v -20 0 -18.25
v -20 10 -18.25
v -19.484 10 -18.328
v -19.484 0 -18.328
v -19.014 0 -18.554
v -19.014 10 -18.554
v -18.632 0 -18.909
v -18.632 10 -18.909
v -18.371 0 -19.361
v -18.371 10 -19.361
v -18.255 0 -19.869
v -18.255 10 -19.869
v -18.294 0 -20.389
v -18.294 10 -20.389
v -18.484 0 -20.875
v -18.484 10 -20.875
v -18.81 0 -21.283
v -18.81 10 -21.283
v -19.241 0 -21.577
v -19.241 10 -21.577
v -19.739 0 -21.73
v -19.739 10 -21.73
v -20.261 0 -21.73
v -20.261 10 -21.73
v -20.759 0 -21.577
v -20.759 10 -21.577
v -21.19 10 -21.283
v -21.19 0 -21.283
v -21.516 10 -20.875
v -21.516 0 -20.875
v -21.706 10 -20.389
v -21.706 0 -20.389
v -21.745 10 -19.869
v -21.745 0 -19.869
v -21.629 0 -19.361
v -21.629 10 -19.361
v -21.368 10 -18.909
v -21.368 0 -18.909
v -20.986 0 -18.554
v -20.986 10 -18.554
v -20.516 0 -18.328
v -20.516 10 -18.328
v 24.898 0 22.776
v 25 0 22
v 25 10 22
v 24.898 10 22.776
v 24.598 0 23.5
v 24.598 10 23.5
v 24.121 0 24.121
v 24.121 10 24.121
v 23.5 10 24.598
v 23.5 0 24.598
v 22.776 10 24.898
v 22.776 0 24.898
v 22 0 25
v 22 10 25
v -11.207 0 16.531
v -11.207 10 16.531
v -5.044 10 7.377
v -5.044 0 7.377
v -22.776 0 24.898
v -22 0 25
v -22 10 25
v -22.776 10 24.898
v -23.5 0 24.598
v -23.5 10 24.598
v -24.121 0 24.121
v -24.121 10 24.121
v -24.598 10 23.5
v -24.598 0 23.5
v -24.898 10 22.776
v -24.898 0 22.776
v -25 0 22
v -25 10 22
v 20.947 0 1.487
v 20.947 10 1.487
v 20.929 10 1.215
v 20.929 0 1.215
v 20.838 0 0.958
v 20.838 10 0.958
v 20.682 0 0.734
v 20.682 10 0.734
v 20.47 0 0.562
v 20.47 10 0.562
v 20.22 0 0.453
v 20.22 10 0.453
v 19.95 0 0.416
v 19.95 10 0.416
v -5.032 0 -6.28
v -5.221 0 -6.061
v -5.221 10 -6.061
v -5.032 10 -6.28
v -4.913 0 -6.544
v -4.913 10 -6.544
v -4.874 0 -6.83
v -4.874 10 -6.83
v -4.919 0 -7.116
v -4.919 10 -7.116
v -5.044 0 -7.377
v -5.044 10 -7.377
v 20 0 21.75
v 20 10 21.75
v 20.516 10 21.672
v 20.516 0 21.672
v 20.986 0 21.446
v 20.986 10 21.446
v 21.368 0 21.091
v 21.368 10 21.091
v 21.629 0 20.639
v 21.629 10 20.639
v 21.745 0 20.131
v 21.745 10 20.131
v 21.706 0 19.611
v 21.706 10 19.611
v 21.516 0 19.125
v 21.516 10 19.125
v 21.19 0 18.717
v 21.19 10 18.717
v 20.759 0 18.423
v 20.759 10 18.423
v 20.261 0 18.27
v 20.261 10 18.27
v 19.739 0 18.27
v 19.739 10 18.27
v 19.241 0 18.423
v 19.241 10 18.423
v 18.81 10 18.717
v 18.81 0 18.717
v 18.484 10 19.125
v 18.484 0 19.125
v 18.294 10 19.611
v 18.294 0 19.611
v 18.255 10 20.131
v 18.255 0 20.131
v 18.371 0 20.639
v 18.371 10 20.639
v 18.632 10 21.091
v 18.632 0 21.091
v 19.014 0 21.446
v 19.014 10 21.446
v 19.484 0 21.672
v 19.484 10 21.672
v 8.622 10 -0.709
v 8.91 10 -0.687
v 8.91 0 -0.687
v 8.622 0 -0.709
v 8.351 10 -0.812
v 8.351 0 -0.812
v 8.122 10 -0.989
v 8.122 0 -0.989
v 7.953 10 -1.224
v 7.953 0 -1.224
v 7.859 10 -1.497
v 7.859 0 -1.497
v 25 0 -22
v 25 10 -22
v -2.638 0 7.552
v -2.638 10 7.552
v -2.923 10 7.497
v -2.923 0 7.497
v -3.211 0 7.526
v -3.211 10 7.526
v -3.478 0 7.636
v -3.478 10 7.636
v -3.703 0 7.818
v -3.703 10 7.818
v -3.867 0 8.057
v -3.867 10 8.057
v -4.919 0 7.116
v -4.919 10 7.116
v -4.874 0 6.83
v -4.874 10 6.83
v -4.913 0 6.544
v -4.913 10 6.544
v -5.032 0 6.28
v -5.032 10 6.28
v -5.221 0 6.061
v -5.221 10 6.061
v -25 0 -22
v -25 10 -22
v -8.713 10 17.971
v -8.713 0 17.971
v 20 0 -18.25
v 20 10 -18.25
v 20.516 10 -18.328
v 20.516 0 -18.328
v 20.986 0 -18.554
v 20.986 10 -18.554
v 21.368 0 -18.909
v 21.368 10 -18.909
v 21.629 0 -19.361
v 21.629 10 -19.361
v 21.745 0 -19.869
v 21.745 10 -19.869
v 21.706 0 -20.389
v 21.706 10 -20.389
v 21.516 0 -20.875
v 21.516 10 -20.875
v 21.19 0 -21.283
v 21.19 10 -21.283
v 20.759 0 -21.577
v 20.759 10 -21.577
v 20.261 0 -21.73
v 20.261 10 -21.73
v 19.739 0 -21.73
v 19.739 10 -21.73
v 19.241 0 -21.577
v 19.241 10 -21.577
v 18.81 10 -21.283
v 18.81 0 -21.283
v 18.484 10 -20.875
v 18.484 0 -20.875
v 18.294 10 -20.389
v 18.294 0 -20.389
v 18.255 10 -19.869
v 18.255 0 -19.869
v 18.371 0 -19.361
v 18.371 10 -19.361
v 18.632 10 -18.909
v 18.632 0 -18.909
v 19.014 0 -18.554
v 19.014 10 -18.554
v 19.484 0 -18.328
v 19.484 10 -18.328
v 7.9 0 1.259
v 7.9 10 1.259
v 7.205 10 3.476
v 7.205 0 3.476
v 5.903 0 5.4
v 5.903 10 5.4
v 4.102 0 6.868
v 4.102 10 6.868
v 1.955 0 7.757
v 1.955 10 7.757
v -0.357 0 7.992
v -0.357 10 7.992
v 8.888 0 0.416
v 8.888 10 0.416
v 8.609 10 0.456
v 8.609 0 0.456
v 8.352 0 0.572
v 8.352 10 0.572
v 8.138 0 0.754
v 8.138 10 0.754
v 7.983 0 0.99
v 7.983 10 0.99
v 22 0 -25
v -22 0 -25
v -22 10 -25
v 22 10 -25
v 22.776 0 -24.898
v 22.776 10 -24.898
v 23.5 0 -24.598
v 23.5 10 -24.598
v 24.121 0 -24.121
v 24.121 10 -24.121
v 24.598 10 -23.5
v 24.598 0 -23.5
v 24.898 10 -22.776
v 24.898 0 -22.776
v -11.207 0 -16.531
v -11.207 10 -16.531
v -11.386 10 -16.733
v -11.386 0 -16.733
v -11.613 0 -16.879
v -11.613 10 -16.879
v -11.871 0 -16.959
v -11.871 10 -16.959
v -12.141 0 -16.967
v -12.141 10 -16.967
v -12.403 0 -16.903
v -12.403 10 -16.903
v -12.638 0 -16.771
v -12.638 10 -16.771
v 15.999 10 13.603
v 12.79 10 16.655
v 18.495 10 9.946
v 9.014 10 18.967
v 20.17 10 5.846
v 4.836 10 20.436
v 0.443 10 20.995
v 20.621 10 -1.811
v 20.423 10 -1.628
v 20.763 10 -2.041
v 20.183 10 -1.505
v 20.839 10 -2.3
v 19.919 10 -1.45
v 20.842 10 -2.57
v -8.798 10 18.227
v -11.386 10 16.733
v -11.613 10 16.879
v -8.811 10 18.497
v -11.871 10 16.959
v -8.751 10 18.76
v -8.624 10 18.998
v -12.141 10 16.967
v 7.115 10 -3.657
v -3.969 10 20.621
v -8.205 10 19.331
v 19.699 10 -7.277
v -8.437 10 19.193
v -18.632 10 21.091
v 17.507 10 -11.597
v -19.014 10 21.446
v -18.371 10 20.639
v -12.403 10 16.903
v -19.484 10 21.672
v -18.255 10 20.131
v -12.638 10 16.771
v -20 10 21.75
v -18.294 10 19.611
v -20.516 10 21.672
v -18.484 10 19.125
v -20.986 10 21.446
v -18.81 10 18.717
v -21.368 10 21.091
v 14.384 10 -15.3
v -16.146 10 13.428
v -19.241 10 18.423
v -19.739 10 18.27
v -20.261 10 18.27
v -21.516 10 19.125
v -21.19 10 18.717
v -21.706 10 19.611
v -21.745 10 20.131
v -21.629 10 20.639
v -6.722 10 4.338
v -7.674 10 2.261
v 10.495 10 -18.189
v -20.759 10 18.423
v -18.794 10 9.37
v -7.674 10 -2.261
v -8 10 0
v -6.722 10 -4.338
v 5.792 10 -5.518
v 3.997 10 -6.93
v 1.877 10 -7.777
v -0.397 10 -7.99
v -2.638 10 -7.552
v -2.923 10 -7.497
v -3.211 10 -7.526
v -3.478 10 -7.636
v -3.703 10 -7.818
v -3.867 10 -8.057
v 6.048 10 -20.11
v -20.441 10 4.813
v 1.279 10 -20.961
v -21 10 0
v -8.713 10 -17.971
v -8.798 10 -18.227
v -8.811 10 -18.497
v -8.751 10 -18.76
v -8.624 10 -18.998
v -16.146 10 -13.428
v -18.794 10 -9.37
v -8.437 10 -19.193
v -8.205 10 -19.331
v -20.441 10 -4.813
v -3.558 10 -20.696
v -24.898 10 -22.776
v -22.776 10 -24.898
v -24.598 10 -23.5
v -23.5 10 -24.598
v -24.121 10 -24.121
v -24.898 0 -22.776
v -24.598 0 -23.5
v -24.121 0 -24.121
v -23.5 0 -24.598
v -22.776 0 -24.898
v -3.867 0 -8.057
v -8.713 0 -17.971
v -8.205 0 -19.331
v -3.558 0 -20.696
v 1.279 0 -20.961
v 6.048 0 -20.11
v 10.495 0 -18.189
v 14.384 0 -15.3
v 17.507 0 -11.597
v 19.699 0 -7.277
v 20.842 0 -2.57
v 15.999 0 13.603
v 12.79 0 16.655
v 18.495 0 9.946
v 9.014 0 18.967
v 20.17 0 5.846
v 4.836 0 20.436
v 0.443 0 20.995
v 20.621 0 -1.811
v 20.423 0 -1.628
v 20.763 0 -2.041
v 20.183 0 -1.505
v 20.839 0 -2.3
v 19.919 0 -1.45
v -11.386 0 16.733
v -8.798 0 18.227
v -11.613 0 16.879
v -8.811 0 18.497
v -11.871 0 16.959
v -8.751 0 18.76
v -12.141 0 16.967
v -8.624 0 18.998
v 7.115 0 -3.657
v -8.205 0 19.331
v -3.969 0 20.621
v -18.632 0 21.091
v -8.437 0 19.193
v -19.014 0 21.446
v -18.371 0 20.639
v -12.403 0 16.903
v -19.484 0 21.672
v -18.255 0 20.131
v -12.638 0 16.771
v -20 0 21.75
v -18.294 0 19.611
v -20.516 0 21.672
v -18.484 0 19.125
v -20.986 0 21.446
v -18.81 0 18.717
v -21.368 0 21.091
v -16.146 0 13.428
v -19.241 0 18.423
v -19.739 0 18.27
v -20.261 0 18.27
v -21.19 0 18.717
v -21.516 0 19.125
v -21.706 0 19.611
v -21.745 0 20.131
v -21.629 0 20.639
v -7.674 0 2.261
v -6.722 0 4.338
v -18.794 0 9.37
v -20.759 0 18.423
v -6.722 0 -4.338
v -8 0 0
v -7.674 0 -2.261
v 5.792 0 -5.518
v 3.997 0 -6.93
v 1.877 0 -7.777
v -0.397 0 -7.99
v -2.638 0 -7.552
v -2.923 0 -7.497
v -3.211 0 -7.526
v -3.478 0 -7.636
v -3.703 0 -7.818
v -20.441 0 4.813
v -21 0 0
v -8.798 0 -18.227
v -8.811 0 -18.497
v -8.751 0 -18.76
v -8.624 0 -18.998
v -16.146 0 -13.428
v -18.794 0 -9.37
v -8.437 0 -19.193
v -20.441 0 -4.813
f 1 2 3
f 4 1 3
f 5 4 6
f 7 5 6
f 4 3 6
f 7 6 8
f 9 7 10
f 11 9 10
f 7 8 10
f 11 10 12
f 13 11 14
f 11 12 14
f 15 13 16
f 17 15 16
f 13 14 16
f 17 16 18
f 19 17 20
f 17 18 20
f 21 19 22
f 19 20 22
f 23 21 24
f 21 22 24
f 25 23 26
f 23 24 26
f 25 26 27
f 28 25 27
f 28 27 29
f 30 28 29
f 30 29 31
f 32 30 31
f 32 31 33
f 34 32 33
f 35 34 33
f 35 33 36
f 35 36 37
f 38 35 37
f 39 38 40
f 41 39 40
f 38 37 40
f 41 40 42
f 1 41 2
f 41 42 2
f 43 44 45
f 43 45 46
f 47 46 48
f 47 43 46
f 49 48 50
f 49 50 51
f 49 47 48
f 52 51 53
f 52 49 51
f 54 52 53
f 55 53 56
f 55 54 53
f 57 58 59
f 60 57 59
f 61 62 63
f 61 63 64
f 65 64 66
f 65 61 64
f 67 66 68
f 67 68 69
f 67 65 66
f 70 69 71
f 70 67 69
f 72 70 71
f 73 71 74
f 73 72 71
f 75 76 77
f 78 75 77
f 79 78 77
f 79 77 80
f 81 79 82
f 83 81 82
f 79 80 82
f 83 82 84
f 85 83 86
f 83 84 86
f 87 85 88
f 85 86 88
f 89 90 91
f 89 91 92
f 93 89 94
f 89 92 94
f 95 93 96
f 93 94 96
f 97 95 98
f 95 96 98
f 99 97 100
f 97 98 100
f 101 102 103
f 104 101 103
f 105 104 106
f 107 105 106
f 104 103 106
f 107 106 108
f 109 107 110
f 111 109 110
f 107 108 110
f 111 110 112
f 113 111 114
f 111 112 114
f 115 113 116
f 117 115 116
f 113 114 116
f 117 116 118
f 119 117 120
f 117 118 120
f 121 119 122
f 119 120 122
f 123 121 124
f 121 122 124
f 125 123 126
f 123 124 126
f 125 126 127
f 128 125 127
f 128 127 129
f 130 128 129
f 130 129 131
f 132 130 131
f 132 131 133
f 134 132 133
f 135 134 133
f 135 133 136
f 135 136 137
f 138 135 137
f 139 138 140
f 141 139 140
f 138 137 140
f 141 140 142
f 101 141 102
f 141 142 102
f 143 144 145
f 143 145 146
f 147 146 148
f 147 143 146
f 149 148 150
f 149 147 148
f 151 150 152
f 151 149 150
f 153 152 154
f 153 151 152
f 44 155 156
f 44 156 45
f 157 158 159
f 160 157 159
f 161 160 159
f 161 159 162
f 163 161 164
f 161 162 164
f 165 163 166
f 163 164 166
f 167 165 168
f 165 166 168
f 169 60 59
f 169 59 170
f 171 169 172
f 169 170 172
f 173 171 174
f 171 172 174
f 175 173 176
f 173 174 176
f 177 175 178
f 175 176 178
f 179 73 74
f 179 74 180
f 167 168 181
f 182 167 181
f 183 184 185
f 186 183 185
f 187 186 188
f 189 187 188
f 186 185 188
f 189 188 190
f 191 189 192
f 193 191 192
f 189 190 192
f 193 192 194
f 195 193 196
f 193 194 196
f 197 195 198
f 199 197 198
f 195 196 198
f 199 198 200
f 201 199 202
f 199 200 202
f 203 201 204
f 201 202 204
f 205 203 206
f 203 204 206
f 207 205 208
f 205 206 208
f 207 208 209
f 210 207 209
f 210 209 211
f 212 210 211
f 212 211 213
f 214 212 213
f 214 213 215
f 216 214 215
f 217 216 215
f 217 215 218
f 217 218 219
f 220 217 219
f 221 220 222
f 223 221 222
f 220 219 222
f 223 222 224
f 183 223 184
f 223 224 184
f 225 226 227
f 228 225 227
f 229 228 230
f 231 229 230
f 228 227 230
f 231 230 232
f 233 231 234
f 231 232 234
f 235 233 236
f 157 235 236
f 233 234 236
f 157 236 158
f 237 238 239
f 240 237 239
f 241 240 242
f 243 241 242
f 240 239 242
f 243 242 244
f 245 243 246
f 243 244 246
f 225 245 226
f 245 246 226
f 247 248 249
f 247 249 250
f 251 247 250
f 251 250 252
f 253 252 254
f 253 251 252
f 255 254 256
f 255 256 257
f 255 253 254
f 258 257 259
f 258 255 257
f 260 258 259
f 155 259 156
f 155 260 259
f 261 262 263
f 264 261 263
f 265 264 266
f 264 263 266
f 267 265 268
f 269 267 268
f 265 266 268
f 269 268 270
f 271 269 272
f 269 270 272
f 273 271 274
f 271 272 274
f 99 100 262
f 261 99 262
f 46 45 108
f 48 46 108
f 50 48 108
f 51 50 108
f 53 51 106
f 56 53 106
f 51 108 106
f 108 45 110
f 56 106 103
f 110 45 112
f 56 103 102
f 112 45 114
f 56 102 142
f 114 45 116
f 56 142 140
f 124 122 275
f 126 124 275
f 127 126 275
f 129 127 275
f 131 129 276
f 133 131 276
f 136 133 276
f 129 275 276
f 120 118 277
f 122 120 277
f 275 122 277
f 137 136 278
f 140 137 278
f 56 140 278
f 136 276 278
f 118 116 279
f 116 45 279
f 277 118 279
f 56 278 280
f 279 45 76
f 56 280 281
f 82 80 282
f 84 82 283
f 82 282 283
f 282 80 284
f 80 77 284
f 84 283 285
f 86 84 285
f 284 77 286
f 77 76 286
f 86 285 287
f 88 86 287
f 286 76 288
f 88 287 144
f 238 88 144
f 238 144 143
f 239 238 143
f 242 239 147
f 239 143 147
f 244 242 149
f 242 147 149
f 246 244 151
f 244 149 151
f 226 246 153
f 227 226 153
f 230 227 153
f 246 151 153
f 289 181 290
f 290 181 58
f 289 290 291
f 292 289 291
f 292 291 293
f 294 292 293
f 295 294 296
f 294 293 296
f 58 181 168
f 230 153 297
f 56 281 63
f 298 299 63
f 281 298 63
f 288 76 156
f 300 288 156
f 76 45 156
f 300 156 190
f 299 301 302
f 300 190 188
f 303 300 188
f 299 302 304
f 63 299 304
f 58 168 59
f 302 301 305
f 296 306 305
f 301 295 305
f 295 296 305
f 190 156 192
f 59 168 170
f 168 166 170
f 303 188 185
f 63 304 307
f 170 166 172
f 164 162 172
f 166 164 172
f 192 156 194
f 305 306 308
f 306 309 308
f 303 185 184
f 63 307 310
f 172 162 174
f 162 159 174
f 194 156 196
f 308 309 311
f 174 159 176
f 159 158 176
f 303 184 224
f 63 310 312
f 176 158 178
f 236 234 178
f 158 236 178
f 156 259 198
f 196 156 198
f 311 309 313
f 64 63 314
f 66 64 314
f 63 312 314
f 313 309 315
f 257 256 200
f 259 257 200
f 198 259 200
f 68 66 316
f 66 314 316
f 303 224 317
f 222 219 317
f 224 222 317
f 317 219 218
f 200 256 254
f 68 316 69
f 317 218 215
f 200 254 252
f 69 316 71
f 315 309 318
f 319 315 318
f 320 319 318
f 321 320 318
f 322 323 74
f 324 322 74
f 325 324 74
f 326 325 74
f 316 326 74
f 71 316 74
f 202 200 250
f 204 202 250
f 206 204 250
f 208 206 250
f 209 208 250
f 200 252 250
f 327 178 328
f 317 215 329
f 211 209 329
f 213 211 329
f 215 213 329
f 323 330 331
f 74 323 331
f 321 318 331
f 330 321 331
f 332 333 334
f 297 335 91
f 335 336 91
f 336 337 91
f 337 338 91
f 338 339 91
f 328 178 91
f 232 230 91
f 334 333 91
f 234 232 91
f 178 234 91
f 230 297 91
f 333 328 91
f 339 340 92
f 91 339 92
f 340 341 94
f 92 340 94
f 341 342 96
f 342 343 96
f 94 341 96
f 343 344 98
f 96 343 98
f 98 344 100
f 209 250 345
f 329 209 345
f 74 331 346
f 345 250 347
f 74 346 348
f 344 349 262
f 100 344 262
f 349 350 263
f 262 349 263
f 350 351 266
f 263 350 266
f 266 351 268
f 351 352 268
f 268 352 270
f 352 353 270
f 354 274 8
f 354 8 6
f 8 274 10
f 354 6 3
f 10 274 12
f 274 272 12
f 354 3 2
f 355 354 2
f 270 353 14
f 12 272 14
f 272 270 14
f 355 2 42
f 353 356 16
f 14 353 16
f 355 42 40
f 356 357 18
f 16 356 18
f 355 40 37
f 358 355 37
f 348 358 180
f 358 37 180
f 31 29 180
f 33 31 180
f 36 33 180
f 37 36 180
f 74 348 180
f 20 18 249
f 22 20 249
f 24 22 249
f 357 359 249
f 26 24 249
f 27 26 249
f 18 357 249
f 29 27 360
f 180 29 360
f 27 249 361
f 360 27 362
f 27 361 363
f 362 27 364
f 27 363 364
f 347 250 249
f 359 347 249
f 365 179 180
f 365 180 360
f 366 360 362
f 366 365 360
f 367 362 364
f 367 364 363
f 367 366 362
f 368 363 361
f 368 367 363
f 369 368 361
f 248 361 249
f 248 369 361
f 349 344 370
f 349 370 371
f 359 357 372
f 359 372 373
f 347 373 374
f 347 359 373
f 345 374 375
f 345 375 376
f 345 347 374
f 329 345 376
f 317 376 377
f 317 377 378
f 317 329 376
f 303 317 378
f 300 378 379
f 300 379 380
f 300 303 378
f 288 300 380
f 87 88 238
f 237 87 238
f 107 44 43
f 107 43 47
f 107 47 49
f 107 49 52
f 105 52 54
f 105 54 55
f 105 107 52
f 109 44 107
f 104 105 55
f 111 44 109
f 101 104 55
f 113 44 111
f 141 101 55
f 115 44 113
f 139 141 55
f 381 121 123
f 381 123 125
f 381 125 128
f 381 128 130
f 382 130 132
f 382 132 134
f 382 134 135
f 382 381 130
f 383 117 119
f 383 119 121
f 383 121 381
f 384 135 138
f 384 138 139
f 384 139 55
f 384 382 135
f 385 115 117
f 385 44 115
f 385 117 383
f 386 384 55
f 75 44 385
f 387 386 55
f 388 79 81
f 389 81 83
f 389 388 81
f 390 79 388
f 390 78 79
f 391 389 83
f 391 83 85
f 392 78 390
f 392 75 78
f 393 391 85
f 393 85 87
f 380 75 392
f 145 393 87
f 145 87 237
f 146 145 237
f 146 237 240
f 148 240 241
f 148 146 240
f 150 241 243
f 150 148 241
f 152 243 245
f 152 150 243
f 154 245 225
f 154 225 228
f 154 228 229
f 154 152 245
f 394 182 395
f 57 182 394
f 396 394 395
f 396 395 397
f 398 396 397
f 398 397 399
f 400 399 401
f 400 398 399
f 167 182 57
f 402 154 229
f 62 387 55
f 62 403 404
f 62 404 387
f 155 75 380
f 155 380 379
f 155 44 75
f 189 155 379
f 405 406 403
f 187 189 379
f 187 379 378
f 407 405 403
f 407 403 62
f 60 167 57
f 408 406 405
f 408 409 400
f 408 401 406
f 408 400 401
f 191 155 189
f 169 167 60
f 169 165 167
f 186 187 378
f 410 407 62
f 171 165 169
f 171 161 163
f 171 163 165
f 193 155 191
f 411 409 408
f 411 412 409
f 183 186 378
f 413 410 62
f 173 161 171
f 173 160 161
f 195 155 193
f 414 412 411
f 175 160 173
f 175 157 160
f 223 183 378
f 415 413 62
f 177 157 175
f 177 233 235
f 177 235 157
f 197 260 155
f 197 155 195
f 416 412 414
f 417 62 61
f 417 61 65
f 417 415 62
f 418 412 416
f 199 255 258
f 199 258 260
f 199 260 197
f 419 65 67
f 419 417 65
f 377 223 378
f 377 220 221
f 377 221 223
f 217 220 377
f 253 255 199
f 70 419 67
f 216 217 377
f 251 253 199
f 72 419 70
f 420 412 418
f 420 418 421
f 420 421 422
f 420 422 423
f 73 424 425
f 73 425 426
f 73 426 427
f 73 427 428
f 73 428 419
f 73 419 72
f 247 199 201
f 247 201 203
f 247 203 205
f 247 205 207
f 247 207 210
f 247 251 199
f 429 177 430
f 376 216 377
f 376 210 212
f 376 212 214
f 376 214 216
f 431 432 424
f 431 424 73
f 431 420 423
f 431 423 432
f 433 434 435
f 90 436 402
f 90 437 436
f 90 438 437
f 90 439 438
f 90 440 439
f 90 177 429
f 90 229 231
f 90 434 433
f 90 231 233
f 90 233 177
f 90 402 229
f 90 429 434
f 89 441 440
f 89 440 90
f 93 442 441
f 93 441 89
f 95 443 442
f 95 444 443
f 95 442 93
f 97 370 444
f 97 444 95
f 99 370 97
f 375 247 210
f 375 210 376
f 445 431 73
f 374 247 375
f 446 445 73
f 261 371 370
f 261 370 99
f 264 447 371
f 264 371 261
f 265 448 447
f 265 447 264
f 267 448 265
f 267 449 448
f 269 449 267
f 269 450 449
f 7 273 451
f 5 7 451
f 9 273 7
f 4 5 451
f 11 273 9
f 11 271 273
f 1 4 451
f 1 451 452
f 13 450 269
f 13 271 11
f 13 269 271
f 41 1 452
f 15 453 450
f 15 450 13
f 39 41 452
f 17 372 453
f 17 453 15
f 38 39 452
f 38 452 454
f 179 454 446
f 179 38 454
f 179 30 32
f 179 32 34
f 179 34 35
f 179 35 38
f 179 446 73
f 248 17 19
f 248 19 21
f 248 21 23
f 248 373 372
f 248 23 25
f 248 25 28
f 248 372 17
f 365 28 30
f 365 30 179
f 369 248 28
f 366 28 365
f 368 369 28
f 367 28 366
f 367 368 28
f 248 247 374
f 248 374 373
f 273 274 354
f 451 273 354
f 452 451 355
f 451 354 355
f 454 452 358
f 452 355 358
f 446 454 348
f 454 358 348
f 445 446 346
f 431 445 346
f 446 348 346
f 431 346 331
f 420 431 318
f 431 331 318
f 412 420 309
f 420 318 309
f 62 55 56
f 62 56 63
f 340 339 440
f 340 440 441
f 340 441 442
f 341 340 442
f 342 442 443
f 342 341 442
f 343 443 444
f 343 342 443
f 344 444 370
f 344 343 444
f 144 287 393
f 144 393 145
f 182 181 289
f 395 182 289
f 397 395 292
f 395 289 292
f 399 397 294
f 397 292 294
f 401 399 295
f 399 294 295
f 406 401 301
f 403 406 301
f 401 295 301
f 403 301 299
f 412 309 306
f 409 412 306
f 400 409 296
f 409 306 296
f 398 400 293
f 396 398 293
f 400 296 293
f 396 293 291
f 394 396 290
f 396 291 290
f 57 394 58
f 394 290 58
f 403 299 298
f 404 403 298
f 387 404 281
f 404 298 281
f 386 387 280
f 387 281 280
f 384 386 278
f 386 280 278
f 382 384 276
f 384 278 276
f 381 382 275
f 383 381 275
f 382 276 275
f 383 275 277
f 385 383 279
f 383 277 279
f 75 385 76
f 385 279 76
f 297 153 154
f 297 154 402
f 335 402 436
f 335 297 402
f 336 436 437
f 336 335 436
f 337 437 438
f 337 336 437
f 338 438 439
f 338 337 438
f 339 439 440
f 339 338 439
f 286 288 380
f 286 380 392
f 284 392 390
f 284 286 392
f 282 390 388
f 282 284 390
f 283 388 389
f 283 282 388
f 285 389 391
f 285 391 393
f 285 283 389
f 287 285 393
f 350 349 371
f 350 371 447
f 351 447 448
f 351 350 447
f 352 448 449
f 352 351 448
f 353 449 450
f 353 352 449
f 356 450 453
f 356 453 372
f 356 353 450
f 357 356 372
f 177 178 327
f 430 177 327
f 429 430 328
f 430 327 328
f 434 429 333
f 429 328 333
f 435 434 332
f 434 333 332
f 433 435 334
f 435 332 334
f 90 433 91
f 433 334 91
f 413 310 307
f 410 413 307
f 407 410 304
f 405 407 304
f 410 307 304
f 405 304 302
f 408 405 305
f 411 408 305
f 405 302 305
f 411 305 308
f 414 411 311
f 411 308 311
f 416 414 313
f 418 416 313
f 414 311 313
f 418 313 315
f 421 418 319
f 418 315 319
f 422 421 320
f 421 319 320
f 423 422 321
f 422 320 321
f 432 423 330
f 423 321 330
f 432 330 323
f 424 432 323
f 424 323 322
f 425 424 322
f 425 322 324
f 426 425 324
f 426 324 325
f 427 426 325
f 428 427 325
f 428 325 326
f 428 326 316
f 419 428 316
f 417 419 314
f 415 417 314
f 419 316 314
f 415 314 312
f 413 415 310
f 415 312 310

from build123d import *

# Parameters (mm, degrees)
DODANIE_WYCI_GNI_CIE1_DEPTH = 10
SZKIC2_R                    = 1.75
WYTNIJ_WYCI_GNI_CIE1_DEPTH  = 10


with BuildPart() as part:
    # Szkic1 → Dodanie-wyciągnięcie1 (new body)
    with BuildSketch(Plane(origin=(0, 0, 0), x_dir=(1, 0, 0), z_dir=(0, 1, 0))):
        with BuildLine():
            Line((22, -25), (-22, -25))
            ThreePointArc((-22, -25), (-24.121320344, -24.121320344), (-25, -22))
            Line((-25, -22), (-25, 22))
            ThreePointArc((-25, 22), (-24.121320344, 24.121320344), (-22, 25))
            Line((-22, 25), (22, 25))
            ThreePointArc((22, 25), (24.121320344, 24.121320344), (25, 22))
            Line((25, 22), (25, -22))
            ThreePointArc((25, -22), (24.121320344, -24.121320344), (22, -25))
        make_face()
    extrude(amount=DODANIE_WYCI_GNI_CIE1_DEPTH)

    # Szkic2 → Wytnij-wyciągnięcie1 (cut)
    with BuildSketch(Plane(origin=(0, 10, 0), x_dir=(1, 0, 0), z_dir=(0, 1, 0))):
        with Locations(Location((-20, 20, 0), (0, 0, 270))):
            Circle(SZKIC2_R)
        with Locations(Location((20, 20, 0), (0, 0, 270))):
            Circle(SZKIC2_R)
        with Locations(Location((20, -20, 0), (0, 0, 270))):
            Circle(SZKIC2_R)
        with Locations(Location((-20, -20, 0), (0, 0, 270))):
            Circle(SZKIC2_R)
        with BuildLine():
            Line((19.949804326, -0.416088747), (8.887895851, -0.416088747))
            ThreePointArc((8.887895851, -0.416088747), (8.238797705, -0.655384076), (7.900351868, -1.258745553))
            ThreePointArc((7.900351868, -1.258745553), (4.101739563, -6.868459256), (-2.638482905, -7.552377636))
            ThreePointArc((-2.638482905, -7.552377636), (-3.348489276, -7.571518902), (-3.866696101, -8.057252494))
            Line((-3.866696101, -8.057252494), (-8.71289149, -17.970981564))
            ThreePointArc((-8.71289149, -17.970981564), (-8.751315605, -18.759947091), (-8.20521309, -19.330661607))
            ThreePointArc((-8.20521309, -19.330661607), (10.963128103, -17.911164736), (20.947294543, -1.486893185))
            ThreePointArc((20.947294543, -1.486893185), (20.681516168, -0.734474647), (19.949804326, -0.416088747))
        make_face()
        with BuildLine():
            Line((19.918829975, 1.449846448), (8.910113622, 0.686816973))
            ThreePointArc((8.910113622, 0.686816973), (8.230490402, 0.892390127), (7.858638328, 1.497265385))
            ThreePointArc((7.858638328, 1.497265385), (3.997324324, 6.929747344), (-2.638482905, 7.552377636))
            ThreePointArc((-2.638482905, 7.552377636), (-3.348489276, 7.571518902), (-3.866696101, 8.057252494))
            Line((-3.866696101, 8.057252494), (-8.71289149, 17.970981564))
            ThreePointArc((-8.71289149, 17.970981564), (-8.751315605, 18.759947091), (-8.20521309, 19.330661607))
            ThreePointArc((-8.20521309, 19.330661607), (10.495454585, 18.189157019), (20.842168696, 2.569825685))
            ThreePointArc((20.842168696, 2.569825685), (20.621275551, 1.81133417), (19.918829975, 1.449846448))
        make_face()
        with BuildLine():
            Line((-11.206880821, -16.531076152), (-5.044437294, -7.377283299))
            ThreePointArc((-5.044437294, -7.377283299), (-4.882883076, -6.685636228), (-5.221309439, -6.061182041))
            ThreePointArc((-5.221309439, -6.061182041), (-8, 0), (-5.221309439, 6.061182041))
            ThreePointArc((-5.221309439, 6.061182041), (-4.882883076, 6.685636228), (-5.044437294, 7.377283299))
            Line((-5.044437294, 7.377283299), (-11.206880821, 16.531076152))
            ThreePointArc((-11.206880821, 16.531076152), (-11.870932952, 16.958835176), (-12.638237478, 16.771253783))
            ThreePointArc((-12.638237478, 16.771253783), (-21, 0), (-12.638237478, -16.771253783))
            ThreePointArc((-12.638237478, -16.771253783), (-11.870932952, -16.958835176), (-11.206880821, -16.531076152))
        make_face()
    extrude(amount=-WYTNIJ_WYCI_GNI_CIE1_DEPTH, mode=Mode.SUBTRACT)


solid = part.part
